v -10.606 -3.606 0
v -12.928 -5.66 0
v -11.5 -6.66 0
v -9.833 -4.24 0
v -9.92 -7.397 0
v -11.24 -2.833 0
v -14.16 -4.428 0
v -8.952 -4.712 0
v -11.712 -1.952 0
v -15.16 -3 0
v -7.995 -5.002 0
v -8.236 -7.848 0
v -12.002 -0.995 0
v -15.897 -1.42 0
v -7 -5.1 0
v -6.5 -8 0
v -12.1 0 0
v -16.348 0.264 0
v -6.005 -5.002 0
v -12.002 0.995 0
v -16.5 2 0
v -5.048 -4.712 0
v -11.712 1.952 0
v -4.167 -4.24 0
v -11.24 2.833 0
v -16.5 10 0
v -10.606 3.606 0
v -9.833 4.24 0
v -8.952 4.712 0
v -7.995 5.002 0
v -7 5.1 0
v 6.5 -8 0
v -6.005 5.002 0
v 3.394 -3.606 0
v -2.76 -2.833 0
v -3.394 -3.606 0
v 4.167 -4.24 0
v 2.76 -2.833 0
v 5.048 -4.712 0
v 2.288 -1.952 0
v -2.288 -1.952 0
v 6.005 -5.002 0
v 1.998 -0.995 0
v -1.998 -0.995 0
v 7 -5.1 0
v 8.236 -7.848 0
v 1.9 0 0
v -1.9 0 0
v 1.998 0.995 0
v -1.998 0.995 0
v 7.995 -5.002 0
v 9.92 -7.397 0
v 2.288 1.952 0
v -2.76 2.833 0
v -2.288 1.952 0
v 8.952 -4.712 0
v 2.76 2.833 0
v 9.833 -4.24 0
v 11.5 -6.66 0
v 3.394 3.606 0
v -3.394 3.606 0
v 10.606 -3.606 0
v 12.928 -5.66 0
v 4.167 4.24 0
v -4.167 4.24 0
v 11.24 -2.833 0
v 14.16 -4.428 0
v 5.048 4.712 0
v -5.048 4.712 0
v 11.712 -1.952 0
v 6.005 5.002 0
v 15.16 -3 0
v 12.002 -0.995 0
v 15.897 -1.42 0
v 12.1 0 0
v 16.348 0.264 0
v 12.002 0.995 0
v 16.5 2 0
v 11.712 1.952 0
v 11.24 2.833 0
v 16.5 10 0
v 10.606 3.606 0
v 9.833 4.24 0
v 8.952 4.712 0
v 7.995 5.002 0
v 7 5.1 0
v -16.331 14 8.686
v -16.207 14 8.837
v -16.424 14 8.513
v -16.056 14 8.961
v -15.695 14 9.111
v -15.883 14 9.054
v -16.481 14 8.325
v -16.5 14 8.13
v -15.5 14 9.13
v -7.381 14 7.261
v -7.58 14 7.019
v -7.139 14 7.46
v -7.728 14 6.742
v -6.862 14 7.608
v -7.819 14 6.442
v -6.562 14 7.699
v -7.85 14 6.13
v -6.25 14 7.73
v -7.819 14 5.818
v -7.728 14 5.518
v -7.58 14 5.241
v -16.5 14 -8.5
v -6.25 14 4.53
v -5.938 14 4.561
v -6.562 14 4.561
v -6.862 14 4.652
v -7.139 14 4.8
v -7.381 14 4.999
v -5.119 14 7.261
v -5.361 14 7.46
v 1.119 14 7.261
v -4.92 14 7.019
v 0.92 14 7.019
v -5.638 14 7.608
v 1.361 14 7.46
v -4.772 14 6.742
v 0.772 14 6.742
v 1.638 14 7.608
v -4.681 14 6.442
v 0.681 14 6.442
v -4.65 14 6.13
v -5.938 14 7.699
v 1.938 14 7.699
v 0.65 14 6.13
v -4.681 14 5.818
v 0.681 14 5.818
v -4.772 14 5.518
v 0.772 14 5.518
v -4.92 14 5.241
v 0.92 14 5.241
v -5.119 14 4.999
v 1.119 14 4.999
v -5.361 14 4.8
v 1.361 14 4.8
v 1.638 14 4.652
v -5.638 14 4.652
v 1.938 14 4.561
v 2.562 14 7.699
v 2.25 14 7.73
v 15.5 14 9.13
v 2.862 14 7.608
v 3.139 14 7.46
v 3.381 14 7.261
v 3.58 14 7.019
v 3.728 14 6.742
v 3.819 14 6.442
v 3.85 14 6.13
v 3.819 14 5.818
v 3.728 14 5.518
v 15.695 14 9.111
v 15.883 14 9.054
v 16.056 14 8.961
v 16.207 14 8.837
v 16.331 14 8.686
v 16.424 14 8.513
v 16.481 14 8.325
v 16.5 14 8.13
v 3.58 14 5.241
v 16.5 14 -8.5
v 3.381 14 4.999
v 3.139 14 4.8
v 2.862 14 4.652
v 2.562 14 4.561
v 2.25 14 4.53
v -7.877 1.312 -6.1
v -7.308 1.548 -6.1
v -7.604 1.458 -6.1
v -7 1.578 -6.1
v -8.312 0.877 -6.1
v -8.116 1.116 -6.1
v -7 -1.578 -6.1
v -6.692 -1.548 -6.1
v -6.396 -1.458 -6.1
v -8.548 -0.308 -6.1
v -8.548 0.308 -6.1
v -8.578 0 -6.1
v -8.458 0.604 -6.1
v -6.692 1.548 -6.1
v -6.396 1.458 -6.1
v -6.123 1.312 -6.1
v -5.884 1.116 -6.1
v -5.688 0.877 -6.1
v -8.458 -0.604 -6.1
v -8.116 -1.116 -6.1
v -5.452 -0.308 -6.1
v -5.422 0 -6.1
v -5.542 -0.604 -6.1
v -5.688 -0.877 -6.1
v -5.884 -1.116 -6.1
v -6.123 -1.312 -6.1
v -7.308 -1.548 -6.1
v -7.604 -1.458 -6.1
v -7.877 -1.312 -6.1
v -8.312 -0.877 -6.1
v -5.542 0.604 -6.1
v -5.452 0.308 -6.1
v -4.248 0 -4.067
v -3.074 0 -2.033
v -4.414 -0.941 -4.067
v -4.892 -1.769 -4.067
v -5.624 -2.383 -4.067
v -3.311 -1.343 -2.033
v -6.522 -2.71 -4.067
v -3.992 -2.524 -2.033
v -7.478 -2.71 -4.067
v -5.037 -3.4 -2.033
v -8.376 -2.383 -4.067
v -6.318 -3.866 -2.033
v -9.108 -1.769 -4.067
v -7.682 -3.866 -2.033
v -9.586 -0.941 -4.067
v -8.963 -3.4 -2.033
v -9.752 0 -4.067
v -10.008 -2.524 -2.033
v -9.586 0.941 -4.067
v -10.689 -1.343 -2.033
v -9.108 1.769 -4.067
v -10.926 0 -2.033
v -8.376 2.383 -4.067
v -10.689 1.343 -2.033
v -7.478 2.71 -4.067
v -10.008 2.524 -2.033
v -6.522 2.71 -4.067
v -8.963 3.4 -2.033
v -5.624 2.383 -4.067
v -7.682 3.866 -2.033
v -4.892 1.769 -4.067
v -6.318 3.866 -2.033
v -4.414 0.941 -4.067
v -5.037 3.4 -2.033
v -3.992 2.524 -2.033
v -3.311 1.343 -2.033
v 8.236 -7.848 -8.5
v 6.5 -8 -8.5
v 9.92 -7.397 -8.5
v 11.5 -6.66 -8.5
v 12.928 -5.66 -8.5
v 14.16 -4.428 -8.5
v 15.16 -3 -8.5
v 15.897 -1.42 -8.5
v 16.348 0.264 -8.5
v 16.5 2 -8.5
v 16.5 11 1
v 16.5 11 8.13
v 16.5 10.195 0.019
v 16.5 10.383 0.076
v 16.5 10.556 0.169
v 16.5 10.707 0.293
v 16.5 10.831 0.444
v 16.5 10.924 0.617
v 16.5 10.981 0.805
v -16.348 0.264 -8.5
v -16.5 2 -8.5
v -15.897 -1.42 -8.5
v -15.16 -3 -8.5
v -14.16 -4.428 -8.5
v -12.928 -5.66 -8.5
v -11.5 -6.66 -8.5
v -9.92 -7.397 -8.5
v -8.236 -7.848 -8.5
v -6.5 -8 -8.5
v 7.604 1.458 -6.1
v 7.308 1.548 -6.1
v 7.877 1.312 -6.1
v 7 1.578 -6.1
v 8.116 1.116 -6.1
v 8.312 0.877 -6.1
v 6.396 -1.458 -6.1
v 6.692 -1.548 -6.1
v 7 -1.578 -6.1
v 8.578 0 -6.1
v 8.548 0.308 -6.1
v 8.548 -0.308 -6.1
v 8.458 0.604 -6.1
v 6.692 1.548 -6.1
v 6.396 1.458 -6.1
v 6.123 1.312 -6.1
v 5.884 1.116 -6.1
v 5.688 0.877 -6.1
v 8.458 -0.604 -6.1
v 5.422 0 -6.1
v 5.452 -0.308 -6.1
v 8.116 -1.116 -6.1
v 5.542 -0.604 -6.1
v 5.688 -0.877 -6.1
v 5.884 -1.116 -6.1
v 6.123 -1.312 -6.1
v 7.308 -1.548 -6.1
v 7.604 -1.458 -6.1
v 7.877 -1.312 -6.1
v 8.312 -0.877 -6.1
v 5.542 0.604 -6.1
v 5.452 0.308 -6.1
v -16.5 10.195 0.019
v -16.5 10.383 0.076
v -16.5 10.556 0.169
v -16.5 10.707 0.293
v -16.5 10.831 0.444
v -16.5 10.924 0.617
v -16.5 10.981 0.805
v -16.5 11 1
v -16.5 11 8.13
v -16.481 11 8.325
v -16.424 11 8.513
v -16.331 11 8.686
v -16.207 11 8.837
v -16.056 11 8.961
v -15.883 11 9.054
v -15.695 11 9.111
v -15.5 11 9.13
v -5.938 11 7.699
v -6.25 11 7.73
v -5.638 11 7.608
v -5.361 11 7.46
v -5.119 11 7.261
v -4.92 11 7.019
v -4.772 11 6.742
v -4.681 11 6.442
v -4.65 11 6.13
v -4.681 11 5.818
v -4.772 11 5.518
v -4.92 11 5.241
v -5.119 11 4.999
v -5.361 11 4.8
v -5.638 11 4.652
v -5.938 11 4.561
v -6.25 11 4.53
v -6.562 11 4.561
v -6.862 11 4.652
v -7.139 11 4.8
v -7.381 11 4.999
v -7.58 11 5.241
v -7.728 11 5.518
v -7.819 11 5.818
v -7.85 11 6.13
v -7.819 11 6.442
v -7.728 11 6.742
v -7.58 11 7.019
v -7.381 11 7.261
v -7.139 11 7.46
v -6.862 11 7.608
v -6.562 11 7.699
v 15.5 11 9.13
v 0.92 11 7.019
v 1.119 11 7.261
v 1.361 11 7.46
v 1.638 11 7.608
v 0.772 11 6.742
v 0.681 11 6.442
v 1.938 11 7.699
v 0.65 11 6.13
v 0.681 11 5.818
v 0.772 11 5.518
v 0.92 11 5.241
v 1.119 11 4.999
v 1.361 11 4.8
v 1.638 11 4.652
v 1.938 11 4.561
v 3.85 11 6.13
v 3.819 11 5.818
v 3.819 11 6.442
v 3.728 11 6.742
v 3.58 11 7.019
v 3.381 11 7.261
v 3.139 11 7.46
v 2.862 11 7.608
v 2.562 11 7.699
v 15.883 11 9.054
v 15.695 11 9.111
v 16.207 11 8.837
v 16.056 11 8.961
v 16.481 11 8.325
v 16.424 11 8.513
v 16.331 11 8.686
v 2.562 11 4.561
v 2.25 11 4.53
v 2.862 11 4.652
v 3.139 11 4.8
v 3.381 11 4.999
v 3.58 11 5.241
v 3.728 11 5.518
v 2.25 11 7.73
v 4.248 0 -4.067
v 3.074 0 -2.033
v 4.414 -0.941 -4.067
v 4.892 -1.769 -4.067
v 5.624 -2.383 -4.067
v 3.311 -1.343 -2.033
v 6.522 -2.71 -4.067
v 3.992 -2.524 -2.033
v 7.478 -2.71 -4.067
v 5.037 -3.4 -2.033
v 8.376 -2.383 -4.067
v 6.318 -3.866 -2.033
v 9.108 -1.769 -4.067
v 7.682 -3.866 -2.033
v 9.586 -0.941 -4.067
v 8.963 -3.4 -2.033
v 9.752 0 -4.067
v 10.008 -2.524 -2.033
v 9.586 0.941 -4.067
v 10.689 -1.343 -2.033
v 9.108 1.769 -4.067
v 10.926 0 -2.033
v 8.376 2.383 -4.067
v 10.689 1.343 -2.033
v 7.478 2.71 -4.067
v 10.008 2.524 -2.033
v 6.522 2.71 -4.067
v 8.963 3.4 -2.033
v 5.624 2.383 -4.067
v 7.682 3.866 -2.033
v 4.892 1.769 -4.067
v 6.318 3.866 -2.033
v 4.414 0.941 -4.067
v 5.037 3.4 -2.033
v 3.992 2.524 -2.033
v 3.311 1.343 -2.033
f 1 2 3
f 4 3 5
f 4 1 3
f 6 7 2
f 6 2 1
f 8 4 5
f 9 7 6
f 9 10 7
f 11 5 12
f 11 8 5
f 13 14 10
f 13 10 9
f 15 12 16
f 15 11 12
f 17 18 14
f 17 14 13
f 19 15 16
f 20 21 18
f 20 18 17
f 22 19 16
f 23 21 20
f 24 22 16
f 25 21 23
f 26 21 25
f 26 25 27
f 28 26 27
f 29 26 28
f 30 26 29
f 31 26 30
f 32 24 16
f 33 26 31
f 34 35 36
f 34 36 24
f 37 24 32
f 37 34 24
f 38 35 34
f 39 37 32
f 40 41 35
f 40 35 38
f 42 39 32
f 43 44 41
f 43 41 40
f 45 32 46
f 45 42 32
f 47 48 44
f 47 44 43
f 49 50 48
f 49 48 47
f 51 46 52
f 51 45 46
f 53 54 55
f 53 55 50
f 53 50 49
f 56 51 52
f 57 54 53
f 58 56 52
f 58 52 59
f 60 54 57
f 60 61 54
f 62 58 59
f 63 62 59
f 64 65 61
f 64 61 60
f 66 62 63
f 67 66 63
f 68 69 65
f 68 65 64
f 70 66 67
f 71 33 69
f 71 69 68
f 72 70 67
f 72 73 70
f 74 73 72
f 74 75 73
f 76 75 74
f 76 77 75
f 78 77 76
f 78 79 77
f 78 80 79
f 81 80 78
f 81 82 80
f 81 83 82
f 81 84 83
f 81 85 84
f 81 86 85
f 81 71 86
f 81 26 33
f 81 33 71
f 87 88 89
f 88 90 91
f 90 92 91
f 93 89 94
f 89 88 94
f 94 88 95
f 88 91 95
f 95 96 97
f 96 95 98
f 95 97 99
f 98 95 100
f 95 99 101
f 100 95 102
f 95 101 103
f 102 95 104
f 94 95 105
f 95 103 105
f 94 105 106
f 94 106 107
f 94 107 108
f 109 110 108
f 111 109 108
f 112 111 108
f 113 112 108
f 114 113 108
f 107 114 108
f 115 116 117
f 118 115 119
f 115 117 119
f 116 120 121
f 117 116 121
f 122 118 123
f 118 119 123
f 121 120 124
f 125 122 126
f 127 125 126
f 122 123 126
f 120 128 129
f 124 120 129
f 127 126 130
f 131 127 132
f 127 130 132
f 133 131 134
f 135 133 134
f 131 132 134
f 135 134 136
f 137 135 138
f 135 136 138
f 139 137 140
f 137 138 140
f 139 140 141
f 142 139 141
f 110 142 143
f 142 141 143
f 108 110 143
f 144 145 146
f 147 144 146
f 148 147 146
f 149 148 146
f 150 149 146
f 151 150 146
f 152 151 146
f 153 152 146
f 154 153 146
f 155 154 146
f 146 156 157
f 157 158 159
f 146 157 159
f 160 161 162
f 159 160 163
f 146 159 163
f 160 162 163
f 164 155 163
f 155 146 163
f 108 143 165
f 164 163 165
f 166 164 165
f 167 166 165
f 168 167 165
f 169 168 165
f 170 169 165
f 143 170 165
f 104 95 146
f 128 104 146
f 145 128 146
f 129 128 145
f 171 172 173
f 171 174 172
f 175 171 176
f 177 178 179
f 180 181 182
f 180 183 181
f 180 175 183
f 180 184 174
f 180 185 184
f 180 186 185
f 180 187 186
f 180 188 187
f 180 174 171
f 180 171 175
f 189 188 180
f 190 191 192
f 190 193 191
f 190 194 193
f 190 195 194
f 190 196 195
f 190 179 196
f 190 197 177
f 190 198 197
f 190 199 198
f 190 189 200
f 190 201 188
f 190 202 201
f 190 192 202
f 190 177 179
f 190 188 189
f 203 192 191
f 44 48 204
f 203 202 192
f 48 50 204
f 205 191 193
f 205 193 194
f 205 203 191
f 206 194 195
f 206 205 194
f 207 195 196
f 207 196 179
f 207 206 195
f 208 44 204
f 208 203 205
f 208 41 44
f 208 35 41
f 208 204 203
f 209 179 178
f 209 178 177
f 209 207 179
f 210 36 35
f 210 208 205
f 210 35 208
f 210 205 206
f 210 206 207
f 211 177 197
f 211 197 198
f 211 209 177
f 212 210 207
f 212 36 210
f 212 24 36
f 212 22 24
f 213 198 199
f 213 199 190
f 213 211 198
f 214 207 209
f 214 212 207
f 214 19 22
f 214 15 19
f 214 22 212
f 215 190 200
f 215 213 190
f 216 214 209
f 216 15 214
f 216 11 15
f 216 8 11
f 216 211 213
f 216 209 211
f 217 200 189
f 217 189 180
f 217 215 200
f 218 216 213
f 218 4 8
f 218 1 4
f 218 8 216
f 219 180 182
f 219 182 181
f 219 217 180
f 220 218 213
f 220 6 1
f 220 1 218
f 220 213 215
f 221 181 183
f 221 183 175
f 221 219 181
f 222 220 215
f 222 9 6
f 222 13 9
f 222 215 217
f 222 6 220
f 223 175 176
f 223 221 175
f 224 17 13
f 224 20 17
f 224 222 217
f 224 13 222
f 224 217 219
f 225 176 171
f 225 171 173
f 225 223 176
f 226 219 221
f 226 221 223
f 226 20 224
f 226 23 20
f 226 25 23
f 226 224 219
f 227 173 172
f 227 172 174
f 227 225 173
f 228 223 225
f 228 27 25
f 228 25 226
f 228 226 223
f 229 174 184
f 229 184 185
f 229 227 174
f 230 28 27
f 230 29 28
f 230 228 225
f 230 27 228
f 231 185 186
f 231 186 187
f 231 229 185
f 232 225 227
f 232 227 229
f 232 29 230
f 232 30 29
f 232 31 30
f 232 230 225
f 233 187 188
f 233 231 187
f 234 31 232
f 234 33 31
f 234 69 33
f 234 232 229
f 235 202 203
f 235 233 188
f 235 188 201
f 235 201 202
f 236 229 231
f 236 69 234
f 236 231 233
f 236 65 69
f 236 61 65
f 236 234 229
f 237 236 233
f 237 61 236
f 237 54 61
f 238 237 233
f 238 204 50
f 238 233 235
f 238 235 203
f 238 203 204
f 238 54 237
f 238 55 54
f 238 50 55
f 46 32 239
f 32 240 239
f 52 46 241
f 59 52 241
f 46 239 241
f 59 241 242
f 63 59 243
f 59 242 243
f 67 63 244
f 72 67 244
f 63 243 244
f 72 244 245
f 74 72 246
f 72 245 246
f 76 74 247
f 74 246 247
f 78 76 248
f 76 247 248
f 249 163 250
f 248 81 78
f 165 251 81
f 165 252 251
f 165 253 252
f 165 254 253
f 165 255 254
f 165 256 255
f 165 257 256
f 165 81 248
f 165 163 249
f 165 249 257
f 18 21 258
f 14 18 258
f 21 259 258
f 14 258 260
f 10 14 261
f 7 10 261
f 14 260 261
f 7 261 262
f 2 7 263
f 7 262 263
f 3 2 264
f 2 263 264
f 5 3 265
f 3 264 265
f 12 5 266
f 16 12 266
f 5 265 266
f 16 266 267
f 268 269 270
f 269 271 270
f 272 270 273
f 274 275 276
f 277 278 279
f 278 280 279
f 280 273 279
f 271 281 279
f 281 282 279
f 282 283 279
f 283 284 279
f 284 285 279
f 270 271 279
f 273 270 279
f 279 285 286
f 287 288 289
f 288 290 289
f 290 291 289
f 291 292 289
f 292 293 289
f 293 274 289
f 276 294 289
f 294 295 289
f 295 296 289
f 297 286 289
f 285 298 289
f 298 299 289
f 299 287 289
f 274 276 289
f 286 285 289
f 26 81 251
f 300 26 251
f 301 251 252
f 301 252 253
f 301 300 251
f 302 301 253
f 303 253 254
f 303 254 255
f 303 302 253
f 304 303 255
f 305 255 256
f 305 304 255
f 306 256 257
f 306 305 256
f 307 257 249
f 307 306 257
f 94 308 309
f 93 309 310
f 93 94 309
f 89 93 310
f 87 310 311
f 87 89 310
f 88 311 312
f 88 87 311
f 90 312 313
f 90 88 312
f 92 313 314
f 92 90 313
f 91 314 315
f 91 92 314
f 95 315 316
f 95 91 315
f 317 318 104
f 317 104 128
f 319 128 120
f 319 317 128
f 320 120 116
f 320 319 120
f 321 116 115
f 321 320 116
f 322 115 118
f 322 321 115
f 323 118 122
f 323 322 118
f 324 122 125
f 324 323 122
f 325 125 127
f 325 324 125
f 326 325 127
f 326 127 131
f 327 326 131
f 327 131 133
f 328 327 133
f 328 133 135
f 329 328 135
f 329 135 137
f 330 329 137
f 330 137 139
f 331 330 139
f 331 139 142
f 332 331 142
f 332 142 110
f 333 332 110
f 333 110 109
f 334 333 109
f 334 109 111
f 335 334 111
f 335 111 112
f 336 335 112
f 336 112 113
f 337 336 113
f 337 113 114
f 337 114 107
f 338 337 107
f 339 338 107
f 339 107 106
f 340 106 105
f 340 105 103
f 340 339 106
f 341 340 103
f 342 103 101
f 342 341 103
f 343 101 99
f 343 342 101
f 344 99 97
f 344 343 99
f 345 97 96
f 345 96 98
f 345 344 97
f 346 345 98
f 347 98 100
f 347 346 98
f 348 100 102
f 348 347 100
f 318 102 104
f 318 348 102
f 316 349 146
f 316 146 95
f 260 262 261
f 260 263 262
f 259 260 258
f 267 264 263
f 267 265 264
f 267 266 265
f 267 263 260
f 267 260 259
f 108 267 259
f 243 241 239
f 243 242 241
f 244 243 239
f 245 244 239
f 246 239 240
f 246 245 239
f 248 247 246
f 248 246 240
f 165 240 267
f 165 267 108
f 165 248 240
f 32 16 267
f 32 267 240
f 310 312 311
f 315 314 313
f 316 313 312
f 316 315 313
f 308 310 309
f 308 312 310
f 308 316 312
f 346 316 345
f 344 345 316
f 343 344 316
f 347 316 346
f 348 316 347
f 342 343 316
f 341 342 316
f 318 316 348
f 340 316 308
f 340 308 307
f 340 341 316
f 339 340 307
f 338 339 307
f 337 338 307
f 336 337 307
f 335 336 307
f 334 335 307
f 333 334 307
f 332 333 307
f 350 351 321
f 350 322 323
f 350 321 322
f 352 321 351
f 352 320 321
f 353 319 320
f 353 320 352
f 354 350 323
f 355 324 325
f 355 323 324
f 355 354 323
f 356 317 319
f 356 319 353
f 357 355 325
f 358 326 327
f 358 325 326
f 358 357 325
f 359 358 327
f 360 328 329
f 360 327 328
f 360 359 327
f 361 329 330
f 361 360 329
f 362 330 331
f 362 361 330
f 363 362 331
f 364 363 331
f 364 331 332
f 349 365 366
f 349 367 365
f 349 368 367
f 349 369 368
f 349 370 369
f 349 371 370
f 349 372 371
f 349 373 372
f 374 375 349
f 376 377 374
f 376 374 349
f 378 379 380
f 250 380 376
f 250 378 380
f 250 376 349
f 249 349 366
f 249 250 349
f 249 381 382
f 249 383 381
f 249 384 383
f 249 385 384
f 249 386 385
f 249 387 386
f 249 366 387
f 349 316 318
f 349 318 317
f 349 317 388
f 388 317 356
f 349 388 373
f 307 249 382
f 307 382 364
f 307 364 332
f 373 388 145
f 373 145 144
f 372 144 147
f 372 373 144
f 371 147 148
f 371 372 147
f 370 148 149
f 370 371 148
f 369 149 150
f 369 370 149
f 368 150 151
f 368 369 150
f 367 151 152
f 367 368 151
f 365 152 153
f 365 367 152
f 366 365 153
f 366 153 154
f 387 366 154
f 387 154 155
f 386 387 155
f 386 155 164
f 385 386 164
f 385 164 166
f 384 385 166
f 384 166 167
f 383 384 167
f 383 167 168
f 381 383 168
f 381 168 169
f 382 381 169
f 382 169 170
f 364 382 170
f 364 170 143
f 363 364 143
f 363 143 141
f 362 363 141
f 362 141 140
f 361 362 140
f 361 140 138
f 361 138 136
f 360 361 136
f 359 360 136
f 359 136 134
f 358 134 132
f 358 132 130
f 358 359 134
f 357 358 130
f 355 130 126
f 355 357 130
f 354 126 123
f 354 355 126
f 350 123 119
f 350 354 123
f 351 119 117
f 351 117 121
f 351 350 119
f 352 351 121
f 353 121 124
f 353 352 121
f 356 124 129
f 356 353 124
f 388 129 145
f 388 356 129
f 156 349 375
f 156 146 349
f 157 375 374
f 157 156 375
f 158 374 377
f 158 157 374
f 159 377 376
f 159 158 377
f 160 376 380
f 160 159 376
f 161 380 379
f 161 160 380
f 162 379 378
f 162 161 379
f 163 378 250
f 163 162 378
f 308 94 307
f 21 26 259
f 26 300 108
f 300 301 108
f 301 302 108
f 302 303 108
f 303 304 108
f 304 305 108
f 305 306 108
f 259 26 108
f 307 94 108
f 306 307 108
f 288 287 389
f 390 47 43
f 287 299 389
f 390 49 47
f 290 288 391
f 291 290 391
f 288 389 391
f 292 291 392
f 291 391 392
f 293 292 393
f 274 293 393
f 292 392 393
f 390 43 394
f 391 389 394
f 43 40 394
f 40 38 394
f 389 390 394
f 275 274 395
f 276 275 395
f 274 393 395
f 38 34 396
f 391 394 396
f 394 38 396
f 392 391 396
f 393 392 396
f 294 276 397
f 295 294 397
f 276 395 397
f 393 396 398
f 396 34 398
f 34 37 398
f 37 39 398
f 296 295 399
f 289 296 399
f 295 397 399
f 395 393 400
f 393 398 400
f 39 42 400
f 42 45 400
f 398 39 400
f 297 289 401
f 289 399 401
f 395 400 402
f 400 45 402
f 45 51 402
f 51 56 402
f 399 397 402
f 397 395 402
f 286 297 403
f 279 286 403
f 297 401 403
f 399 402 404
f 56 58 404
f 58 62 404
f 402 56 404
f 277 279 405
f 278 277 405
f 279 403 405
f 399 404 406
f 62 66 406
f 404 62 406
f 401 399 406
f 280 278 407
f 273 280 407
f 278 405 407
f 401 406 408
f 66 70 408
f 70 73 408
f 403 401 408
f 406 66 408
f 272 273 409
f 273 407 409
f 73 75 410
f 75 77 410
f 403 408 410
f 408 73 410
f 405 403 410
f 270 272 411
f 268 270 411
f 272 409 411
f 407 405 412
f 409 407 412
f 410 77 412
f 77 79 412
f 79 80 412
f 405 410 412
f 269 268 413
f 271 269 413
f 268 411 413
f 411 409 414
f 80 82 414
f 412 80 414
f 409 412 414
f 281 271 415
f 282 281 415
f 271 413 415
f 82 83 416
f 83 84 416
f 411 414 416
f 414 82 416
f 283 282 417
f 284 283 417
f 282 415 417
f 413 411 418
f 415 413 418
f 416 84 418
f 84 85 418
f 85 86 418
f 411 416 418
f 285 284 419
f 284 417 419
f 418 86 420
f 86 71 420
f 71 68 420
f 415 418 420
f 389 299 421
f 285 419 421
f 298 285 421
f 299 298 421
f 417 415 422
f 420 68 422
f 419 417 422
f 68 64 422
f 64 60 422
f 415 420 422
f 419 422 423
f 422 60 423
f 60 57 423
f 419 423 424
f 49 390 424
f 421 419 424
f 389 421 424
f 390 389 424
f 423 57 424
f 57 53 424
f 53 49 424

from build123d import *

# Parameters (mm, degrees)
SKETCH_1_W          = 33
SKETCH_1_H          = 16
EXTRUDE_1_DEPTH     = 8.5
SKETCH_4_R          = 1.6
EXTRUDE_2_DEPTH     = 6
FILLET_1_R          = 10
SKETCH_5_W          = 8.5
SKETCH_5_H          = 6
EXTRUDE_3_DEPTH     = 33
CUT_EXTRUDE_1_REACH = 38.991
SKETCH_6_W          = 9.13
SKETCH_6_H          = 3
FILLET_2_R          = 1


with BuildPart() as part:
    # 草图1 → 凸台-拉伸1 (new body)
    with BuildSketch(Plane.XY):
        Rectangle(SKETCH_1_W, SKETCH_1_H)
    extrude(amount=-EXTRUDE_1_DEPTH)

    # 草图3 → 切除-旋转1 (revolve, cut)
    with BuildSketch(Plane(origin=(0, 0, 0), x_dir=(1, 0, 0), z_dir=(0, 1, 0)), mode=Mode.PRIVATE) as cut_revolve_1_sk:
        Polygon((-7, 0), (-7, 6.1), (-8.578163358, 6.1), (-12.1, 0), align=None)
    cut_revolve_1 = revolve(cut_revolve_1_sk.sketch.rotate(Axis((-7, 0, 0), (0, 0, -1)), 180), axis=Axis((-7, 0, 0), (0, 0, -1)), mode=Mode.SUBTRACT)

    # 镜向1: 切除-旋转1 across plane
    add(cut_revolve_1.mirror(Plane(origin=(0, 0, 0), x_dir=(0, 0, 1), z_dir=(1, 0, 0))), mode=Mode.SUBTRACT)

    # 圆角1
    fillet_1_edges = [part.edges().sort_by_distance(p)[0] for p in [
        (16.5, -8, -4.25),
        (-16.5, -8, -4.25),
    ]]
    fillet(fillet_1_edges, radius=FILLET_1_R)



with BuildPart() as body_2:
    # 草图4 → 凸台-拉伸2 (new body)
    with BuildSketch(Plane(origin=(0, 8, 0), x_dir=(1, 0, 0), z_dir=(0, 1, 0))):
        Polygon((-16.5, 0), (-10.5, 0), (6.5, 0), (16.5, 0), (16.5, -9.13), (-16.5, -9.13), align=None)
        with Locations(Location((-6.25, -6.13, 0), (0, 0, 270))):
            Circle(SKETCH_4_R, mode=Mode.SUBTRACT)
        with Locations(Location((2.25, -6.13, 0), (0, 0, 270))):
            Circle(SKETCH_4_R, mode=Mode.SUBTRACT)
    extrude(amount=EXTRUDE_2_DEPTH)


with BuildPart() as part_1:
    add(part.part)

    add(body_2.part)  # 凸台-拉伸3 merges body 2
    # 草图5 → 凸台-拉伸3 (add)
    with BuildSketch(Plane(origin=(16.5, 0, 0), x_dir=(0, 0, -1), z_dir=(1, 0, 0))):
        with Locations((4.25, 11)):
            Rectangle(SKETCH_5_W, SKETCH_5_H)
    extrude(amount=-EXTRUDE_3_DEPTH)

    # 草图6 → 切除-拉伸1 (cut, up to next)
    with BuildSketch(Plane(origin=(16.5, 0, 0), x_dir=(0, 0, -1), z_dir=(1, 0, 0)), mode=Mode.PRIVATE) as cut_extrude_1_sk1:
        with Locations((-4.565, 9.5)):
            Rectangle(SKETCH_6_W, SKETCH_6_H)
    cut_extrude_1_tool1 = extrude(cut_extrude_1_sk1.sketch, amount=-CUT_EXTRUDE_1_REACH, mode=Mode.PRIVATE) & part_1.part
    add(cut_extrude_1_tool1.solids().sort_by_distance((16.5, 9.5, 4.565))[0], mode=Mode.SUBTRACT)

    # 圆角2
    fillet_2_edges = [part_1.edges().sort_by_distance(p)[0] for p in [
        (-16.5, 12.5, 9.13),
        (16.5, 12.5, 9.13),
        (0, 11, 0),
    ]]
    fillet(fillet_2_edges, radius=FILLET_2_R)


solid = part_1.part
